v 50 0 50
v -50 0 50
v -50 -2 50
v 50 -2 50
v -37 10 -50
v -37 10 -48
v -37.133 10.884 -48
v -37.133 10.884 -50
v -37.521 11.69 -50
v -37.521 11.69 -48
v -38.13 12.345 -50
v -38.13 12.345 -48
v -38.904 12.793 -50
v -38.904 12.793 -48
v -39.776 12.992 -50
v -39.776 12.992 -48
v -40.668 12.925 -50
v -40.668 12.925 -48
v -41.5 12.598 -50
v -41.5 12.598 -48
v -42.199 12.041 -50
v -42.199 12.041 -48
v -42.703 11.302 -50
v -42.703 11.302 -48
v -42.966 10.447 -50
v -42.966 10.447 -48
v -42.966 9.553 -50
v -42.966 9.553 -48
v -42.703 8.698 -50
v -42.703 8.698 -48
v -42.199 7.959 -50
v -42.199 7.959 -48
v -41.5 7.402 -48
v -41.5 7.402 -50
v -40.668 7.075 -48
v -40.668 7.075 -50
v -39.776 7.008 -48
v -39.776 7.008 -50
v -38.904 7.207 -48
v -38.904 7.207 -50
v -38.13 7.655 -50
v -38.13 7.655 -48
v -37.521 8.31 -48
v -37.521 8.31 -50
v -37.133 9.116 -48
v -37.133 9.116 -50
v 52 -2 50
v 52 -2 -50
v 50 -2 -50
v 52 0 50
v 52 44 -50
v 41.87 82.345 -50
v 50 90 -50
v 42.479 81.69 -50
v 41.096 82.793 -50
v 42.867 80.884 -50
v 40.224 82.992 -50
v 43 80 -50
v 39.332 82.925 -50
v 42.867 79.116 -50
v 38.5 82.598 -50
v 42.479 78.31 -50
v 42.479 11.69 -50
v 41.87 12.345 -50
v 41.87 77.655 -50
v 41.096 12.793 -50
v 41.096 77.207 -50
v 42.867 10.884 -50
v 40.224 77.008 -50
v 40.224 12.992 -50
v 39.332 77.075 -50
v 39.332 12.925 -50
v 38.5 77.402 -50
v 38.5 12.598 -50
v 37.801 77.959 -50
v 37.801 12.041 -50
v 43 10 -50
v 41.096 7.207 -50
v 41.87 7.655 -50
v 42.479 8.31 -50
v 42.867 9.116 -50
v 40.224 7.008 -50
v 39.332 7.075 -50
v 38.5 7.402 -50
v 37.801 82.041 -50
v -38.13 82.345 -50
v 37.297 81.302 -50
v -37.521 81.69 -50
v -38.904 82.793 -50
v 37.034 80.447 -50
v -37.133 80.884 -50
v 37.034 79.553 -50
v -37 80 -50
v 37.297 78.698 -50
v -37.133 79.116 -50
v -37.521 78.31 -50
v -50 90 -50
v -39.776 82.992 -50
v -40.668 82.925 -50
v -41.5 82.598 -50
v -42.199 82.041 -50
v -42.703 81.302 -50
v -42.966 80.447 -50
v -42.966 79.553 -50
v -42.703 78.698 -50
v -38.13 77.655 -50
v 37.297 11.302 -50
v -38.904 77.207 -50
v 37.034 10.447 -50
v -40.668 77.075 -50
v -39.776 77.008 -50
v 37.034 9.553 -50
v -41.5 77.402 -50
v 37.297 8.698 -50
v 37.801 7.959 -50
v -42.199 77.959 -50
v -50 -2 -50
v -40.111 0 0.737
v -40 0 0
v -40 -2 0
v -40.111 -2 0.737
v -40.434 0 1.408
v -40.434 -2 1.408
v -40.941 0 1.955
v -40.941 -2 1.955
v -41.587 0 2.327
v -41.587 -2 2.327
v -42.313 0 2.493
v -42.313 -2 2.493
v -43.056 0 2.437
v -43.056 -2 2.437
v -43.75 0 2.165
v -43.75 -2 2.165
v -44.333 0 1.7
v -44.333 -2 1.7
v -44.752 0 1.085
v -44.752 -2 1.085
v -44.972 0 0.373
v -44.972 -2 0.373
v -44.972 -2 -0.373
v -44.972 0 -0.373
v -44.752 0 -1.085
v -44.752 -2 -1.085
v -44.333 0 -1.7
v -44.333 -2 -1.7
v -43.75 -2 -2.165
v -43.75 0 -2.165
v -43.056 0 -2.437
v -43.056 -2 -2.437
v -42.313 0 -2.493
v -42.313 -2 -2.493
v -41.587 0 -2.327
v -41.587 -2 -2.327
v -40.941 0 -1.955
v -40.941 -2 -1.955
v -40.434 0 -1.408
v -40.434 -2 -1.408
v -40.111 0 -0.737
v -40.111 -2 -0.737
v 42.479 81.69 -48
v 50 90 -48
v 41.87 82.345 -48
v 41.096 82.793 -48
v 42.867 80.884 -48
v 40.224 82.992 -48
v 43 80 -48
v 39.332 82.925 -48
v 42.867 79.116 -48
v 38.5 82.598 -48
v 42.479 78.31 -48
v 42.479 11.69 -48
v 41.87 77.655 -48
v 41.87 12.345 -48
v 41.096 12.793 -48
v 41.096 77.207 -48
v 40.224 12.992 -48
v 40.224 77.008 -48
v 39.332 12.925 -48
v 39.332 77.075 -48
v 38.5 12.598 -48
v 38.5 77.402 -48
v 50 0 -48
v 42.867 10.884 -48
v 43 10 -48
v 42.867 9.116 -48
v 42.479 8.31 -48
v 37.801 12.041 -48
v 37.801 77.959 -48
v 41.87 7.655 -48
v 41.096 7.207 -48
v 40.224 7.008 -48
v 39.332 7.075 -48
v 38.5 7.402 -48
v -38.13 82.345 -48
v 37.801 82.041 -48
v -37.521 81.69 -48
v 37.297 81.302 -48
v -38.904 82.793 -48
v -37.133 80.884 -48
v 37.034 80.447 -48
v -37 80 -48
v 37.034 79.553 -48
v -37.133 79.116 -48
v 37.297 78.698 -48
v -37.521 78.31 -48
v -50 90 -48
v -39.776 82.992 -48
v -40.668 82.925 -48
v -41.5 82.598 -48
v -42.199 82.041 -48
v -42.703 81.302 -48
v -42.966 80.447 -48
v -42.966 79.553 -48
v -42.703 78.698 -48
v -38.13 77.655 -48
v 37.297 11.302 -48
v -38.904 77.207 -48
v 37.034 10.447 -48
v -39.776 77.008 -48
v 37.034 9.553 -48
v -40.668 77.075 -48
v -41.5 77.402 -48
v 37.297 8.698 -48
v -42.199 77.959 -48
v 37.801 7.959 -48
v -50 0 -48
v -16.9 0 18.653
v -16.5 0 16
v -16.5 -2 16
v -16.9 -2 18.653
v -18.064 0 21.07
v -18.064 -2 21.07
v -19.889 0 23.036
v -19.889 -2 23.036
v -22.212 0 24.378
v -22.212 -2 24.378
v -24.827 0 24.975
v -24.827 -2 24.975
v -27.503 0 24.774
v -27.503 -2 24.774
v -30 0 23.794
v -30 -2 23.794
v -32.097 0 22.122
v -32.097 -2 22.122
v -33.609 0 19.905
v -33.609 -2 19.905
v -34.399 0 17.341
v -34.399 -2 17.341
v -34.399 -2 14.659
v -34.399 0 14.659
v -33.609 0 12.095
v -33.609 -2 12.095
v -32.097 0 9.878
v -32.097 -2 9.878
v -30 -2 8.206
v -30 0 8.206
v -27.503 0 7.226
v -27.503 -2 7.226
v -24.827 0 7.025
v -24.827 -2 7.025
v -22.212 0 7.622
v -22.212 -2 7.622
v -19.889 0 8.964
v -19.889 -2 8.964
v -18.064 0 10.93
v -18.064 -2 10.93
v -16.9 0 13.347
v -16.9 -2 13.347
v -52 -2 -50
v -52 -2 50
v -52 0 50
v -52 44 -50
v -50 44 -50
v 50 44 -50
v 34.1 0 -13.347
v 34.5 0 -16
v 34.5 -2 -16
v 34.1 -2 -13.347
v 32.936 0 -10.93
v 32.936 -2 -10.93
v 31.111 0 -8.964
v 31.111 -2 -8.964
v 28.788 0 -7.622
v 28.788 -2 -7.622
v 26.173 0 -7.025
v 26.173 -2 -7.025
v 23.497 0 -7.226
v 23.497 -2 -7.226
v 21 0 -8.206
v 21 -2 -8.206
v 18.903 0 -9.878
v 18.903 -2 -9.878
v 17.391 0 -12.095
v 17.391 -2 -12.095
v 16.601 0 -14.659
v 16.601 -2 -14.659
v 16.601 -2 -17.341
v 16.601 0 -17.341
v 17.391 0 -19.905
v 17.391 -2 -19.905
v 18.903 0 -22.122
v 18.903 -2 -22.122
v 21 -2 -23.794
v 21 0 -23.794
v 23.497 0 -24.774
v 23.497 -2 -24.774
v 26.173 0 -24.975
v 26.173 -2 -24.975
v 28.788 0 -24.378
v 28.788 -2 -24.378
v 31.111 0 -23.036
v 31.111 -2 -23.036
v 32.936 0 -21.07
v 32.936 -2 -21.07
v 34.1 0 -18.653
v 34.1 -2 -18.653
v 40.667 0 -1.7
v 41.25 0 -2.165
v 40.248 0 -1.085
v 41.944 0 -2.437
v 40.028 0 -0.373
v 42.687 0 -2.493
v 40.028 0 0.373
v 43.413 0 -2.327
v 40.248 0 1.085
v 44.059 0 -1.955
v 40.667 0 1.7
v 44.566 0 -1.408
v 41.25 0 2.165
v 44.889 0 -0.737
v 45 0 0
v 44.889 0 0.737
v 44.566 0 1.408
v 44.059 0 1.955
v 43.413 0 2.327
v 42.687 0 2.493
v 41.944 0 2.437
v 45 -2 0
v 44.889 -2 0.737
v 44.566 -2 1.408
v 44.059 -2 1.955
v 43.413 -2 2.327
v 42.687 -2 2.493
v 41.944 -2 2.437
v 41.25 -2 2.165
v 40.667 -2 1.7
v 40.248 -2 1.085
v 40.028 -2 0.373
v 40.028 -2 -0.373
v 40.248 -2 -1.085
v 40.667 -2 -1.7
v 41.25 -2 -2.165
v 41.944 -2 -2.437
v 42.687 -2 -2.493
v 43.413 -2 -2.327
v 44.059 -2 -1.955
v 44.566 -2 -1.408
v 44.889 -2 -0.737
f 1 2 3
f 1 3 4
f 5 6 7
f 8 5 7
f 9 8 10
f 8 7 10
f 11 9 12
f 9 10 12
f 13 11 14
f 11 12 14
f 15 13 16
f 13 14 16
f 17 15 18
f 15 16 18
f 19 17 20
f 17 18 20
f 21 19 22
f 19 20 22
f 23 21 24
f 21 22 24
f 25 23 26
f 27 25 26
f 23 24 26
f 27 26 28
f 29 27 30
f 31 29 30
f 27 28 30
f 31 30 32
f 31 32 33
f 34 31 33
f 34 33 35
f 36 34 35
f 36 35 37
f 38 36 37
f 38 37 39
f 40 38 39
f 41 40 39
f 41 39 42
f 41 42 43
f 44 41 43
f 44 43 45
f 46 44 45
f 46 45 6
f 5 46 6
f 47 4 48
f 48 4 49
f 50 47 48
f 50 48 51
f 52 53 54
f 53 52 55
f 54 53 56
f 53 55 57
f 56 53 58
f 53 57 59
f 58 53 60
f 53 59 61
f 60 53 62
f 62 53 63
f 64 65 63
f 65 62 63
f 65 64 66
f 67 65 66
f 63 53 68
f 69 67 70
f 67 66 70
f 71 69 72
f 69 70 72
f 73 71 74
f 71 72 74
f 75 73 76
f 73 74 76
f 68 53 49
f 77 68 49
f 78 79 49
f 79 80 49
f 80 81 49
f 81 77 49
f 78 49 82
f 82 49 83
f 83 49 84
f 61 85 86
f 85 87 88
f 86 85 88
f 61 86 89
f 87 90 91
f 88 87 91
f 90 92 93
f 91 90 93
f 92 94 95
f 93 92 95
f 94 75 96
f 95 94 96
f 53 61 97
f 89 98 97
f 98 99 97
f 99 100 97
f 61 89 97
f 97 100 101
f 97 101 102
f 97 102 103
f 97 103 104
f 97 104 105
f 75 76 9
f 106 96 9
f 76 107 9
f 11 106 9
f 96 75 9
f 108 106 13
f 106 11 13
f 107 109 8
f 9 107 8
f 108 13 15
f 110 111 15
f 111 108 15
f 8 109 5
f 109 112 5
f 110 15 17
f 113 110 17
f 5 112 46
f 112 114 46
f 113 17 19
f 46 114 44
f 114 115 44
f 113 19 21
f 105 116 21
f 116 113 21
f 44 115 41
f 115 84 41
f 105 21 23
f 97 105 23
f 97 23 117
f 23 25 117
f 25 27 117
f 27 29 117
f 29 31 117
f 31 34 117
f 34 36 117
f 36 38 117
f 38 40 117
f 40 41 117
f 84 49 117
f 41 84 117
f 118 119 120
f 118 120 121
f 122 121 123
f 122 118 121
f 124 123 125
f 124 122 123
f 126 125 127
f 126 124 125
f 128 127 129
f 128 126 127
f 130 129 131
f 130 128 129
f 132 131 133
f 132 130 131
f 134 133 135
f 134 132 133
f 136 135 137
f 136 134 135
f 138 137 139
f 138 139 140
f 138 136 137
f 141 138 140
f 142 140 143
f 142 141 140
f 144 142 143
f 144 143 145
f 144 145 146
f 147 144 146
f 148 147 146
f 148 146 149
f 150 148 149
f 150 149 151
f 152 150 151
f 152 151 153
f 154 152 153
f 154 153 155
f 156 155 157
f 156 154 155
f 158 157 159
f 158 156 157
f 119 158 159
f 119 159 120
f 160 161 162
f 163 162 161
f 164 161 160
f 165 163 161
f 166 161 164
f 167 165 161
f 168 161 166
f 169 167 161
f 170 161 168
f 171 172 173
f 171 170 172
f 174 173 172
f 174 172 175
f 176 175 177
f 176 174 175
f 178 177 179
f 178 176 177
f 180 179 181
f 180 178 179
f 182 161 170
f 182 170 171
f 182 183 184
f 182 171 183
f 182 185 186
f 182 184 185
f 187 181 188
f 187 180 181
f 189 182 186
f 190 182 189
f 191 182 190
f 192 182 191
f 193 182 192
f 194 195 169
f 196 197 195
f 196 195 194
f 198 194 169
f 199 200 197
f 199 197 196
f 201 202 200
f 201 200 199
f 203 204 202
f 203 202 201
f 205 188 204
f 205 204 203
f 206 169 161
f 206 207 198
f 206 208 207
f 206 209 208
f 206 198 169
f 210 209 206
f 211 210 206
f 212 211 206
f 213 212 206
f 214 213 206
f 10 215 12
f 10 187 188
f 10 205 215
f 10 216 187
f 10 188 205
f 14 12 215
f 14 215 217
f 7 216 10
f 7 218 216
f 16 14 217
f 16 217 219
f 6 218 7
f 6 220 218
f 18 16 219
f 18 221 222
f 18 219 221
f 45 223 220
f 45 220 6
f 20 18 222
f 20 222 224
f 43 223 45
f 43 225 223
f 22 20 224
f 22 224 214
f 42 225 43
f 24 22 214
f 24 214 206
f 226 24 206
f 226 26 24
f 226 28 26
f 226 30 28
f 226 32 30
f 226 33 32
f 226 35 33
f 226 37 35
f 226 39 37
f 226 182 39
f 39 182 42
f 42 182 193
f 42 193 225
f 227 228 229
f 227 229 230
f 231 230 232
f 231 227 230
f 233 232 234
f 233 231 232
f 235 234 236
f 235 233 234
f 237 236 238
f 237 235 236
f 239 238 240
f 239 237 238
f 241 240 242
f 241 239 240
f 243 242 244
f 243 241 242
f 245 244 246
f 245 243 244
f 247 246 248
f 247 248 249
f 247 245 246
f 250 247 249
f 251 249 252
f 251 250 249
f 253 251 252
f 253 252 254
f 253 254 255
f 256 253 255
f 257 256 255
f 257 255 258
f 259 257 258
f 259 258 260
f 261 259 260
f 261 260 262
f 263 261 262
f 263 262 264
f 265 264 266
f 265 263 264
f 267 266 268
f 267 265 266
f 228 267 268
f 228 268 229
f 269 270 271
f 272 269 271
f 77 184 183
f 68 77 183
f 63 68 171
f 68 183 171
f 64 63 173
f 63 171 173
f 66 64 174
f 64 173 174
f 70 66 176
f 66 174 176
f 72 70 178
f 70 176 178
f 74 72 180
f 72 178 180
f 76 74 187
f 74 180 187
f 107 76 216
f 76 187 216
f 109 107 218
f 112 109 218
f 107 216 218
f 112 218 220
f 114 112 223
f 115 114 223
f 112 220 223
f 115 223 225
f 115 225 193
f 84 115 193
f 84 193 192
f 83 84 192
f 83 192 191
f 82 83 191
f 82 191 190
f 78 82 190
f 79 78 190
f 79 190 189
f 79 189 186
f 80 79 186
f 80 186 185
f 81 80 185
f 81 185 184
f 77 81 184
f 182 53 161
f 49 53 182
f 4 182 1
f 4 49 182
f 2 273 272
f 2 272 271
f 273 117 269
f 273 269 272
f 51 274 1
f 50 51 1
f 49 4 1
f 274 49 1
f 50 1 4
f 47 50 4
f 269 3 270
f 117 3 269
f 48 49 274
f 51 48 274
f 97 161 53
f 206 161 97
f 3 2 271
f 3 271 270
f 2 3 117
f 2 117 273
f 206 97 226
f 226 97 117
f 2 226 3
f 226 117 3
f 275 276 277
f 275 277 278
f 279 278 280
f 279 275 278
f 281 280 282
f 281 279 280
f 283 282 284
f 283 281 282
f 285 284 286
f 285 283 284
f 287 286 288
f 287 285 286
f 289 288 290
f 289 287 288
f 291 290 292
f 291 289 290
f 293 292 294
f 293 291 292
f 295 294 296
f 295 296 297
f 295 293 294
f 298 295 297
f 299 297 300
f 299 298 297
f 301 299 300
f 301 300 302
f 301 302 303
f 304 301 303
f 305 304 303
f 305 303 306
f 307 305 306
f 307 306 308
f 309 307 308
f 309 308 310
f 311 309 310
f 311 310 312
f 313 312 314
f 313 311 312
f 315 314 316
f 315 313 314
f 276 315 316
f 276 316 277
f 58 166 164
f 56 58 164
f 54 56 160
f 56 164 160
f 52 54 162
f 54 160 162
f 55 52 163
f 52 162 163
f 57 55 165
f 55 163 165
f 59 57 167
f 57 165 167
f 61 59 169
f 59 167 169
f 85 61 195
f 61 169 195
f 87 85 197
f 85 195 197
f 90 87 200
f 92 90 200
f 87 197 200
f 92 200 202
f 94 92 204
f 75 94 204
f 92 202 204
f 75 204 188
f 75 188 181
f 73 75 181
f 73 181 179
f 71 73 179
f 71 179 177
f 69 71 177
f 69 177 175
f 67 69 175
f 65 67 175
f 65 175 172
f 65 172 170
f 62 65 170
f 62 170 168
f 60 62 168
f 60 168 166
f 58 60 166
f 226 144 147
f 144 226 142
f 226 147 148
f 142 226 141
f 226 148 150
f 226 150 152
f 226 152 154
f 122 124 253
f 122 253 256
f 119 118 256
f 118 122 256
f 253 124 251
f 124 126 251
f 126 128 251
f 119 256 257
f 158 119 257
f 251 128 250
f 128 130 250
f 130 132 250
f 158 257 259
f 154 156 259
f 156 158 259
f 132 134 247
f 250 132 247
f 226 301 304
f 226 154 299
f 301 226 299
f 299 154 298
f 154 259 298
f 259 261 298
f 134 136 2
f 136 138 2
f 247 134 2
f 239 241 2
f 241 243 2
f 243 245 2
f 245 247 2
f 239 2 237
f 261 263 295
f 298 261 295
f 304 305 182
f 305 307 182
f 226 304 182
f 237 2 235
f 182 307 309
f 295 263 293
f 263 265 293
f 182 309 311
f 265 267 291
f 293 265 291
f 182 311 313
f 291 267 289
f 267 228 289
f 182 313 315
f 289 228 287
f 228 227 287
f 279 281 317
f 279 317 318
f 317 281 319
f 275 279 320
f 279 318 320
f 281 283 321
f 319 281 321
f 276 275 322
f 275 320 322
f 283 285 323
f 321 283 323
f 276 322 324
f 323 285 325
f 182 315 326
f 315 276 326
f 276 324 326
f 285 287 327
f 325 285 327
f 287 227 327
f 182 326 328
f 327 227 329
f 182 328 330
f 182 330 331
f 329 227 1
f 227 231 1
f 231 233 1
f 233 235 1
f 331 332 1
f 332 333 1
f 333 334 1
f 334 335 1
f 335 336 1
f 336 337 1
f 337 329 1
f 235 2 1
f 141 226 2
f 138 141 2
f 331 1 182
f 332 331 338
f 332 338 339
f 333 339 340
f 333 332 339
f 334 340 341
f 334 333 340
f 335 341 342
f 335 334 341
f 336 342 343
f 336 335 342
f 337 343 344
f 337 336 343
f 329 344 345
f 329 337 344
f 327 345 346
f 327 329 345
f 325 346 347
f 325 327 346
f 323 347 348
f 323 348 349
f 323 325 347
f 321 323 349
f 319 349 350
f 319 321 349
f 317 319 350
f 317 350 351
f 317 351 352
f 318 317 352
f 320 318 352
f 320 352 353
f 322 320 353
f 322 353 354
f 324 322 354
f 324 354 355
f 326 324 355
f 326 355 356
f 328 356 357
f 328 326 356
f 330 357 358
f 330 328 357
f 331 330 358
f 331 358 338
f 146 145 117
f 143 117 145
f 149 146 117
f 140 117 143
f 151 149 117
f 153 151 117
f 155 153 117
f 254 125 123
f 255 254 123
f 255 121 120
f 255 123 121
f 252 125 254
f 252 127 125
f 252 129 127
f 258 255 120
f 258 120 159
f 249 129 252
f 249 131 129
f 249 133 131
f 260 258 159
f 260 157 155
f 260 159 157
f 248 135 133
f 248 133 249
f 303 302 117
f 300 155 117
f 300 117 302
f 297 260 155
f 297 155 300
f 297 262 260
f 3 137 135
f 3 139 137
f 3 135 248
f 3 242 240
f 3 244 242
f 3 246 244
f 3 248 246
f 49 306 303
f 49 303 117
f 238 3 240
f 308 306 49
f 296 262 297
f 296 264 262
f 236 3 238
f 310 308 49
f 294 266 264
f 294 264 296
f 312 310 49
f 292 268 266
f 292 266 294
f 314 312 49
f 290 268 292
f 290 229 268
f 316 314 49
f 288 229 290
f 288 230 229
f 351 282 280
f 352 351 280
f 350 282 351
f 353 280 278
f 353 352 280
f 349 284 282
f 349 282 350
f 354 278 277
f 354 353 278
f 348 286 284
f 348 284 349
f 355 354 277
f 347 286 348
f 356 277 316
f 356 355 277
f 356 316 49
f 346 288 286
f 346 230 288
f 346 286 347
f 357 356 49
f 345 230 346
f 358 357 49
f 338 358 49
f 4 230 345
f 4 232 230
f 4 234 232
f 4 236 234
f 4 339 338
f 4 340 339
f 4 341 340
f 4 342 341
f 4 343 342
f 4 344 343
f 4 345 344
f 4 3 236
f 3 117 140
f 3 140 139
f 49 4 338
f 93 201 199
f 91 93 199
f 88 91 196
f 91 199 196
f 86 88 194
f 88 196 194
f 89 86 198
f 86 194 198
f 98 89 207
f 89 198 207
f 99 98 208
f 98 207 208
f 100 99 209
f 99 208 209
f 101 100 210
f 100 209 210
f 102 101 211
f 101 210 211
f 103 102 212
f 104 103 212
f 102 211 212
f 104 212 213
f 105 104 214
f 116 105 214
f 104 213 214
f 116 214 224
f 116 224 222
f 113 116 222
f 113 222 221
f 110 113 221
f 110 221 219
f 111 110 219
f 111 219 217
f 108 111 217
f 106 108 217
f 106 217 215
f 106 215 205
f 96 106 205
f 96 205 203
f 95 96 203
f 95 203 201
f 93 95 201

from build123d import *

# Parameters (mm, degrees)
F0_W     = 100
F0_H     = 100
F0_R     = 9
F0_R_2   = 2.5
F1_DEPTH = 2
F2_W     = 100
F2_H     = 2
F3_DEPTH = 90
F4_R     = 3
F5_DEPTH = 25
F7_DEPTH = 2


with BuildPart() as f1:
    # F0 (on Front) → F1 (new body)
    with BuildSketch(Plane.XZ):
        Rectangle(F0_W, F0_H)
        with Locations((25.5, -16)):
            Circle(F0_R, mode=Mode.SUBTRACT)
        with Locations((-42.5, 0)):
            Circle(F0_R_2, mode=Mode.SUBTRACT)
        with Locations((-25.5, 16)):
            Circle(F0_R, mode=Mode.SUBTRACT)
        with Locations((42.5, 0)):
            Circle(F0_R_2, mode=Mode.SUBTRACT)
    extrude(amount=F1_DEPTH)

    # F2 (on face) → F3 (join)
    with BuildSketch(Plane(origin=(0, 0, 0), x_dir=(-1, 0, 0), z_dir=(0, 1, 0))):
        with Locations((0, -49)):
            Rectangle(F2_W, F2_H)
    extrude(amount=F3_DEPTH)

    # F4 (on face) → F5 (cut)
    with BuildSketch(Plane.XY.offset(-48)):
        with Locations((-40, 80)):
            Circle(F4_R)
        with Locations((40, 80)):
            Circle(F4_R)
        with Locations((-40, 10)):
            Circle(F4_R)
        with Locations((40, 10)):
            Circle(F4_R)
    extrude(amount=-F5_DEPTH, mode=Mode.SUBTRACT)


with BuildPart() as f7:
    # F6 (on face) → F7 (new body)
    with BuildSketch(Plane.YZ.offset(50)):
        Polygon((0, 50), (-2, 50), (-2, -50), (44, -50), align=None)
    extrude(amount=F7_DEPTH)


with BuildPart() as f8_1:
    # F8: instance of F7
    add(f7.part.mirror(Plane.YZ))


solid = Compound([f1.part, f7.part, f8_1.part])
